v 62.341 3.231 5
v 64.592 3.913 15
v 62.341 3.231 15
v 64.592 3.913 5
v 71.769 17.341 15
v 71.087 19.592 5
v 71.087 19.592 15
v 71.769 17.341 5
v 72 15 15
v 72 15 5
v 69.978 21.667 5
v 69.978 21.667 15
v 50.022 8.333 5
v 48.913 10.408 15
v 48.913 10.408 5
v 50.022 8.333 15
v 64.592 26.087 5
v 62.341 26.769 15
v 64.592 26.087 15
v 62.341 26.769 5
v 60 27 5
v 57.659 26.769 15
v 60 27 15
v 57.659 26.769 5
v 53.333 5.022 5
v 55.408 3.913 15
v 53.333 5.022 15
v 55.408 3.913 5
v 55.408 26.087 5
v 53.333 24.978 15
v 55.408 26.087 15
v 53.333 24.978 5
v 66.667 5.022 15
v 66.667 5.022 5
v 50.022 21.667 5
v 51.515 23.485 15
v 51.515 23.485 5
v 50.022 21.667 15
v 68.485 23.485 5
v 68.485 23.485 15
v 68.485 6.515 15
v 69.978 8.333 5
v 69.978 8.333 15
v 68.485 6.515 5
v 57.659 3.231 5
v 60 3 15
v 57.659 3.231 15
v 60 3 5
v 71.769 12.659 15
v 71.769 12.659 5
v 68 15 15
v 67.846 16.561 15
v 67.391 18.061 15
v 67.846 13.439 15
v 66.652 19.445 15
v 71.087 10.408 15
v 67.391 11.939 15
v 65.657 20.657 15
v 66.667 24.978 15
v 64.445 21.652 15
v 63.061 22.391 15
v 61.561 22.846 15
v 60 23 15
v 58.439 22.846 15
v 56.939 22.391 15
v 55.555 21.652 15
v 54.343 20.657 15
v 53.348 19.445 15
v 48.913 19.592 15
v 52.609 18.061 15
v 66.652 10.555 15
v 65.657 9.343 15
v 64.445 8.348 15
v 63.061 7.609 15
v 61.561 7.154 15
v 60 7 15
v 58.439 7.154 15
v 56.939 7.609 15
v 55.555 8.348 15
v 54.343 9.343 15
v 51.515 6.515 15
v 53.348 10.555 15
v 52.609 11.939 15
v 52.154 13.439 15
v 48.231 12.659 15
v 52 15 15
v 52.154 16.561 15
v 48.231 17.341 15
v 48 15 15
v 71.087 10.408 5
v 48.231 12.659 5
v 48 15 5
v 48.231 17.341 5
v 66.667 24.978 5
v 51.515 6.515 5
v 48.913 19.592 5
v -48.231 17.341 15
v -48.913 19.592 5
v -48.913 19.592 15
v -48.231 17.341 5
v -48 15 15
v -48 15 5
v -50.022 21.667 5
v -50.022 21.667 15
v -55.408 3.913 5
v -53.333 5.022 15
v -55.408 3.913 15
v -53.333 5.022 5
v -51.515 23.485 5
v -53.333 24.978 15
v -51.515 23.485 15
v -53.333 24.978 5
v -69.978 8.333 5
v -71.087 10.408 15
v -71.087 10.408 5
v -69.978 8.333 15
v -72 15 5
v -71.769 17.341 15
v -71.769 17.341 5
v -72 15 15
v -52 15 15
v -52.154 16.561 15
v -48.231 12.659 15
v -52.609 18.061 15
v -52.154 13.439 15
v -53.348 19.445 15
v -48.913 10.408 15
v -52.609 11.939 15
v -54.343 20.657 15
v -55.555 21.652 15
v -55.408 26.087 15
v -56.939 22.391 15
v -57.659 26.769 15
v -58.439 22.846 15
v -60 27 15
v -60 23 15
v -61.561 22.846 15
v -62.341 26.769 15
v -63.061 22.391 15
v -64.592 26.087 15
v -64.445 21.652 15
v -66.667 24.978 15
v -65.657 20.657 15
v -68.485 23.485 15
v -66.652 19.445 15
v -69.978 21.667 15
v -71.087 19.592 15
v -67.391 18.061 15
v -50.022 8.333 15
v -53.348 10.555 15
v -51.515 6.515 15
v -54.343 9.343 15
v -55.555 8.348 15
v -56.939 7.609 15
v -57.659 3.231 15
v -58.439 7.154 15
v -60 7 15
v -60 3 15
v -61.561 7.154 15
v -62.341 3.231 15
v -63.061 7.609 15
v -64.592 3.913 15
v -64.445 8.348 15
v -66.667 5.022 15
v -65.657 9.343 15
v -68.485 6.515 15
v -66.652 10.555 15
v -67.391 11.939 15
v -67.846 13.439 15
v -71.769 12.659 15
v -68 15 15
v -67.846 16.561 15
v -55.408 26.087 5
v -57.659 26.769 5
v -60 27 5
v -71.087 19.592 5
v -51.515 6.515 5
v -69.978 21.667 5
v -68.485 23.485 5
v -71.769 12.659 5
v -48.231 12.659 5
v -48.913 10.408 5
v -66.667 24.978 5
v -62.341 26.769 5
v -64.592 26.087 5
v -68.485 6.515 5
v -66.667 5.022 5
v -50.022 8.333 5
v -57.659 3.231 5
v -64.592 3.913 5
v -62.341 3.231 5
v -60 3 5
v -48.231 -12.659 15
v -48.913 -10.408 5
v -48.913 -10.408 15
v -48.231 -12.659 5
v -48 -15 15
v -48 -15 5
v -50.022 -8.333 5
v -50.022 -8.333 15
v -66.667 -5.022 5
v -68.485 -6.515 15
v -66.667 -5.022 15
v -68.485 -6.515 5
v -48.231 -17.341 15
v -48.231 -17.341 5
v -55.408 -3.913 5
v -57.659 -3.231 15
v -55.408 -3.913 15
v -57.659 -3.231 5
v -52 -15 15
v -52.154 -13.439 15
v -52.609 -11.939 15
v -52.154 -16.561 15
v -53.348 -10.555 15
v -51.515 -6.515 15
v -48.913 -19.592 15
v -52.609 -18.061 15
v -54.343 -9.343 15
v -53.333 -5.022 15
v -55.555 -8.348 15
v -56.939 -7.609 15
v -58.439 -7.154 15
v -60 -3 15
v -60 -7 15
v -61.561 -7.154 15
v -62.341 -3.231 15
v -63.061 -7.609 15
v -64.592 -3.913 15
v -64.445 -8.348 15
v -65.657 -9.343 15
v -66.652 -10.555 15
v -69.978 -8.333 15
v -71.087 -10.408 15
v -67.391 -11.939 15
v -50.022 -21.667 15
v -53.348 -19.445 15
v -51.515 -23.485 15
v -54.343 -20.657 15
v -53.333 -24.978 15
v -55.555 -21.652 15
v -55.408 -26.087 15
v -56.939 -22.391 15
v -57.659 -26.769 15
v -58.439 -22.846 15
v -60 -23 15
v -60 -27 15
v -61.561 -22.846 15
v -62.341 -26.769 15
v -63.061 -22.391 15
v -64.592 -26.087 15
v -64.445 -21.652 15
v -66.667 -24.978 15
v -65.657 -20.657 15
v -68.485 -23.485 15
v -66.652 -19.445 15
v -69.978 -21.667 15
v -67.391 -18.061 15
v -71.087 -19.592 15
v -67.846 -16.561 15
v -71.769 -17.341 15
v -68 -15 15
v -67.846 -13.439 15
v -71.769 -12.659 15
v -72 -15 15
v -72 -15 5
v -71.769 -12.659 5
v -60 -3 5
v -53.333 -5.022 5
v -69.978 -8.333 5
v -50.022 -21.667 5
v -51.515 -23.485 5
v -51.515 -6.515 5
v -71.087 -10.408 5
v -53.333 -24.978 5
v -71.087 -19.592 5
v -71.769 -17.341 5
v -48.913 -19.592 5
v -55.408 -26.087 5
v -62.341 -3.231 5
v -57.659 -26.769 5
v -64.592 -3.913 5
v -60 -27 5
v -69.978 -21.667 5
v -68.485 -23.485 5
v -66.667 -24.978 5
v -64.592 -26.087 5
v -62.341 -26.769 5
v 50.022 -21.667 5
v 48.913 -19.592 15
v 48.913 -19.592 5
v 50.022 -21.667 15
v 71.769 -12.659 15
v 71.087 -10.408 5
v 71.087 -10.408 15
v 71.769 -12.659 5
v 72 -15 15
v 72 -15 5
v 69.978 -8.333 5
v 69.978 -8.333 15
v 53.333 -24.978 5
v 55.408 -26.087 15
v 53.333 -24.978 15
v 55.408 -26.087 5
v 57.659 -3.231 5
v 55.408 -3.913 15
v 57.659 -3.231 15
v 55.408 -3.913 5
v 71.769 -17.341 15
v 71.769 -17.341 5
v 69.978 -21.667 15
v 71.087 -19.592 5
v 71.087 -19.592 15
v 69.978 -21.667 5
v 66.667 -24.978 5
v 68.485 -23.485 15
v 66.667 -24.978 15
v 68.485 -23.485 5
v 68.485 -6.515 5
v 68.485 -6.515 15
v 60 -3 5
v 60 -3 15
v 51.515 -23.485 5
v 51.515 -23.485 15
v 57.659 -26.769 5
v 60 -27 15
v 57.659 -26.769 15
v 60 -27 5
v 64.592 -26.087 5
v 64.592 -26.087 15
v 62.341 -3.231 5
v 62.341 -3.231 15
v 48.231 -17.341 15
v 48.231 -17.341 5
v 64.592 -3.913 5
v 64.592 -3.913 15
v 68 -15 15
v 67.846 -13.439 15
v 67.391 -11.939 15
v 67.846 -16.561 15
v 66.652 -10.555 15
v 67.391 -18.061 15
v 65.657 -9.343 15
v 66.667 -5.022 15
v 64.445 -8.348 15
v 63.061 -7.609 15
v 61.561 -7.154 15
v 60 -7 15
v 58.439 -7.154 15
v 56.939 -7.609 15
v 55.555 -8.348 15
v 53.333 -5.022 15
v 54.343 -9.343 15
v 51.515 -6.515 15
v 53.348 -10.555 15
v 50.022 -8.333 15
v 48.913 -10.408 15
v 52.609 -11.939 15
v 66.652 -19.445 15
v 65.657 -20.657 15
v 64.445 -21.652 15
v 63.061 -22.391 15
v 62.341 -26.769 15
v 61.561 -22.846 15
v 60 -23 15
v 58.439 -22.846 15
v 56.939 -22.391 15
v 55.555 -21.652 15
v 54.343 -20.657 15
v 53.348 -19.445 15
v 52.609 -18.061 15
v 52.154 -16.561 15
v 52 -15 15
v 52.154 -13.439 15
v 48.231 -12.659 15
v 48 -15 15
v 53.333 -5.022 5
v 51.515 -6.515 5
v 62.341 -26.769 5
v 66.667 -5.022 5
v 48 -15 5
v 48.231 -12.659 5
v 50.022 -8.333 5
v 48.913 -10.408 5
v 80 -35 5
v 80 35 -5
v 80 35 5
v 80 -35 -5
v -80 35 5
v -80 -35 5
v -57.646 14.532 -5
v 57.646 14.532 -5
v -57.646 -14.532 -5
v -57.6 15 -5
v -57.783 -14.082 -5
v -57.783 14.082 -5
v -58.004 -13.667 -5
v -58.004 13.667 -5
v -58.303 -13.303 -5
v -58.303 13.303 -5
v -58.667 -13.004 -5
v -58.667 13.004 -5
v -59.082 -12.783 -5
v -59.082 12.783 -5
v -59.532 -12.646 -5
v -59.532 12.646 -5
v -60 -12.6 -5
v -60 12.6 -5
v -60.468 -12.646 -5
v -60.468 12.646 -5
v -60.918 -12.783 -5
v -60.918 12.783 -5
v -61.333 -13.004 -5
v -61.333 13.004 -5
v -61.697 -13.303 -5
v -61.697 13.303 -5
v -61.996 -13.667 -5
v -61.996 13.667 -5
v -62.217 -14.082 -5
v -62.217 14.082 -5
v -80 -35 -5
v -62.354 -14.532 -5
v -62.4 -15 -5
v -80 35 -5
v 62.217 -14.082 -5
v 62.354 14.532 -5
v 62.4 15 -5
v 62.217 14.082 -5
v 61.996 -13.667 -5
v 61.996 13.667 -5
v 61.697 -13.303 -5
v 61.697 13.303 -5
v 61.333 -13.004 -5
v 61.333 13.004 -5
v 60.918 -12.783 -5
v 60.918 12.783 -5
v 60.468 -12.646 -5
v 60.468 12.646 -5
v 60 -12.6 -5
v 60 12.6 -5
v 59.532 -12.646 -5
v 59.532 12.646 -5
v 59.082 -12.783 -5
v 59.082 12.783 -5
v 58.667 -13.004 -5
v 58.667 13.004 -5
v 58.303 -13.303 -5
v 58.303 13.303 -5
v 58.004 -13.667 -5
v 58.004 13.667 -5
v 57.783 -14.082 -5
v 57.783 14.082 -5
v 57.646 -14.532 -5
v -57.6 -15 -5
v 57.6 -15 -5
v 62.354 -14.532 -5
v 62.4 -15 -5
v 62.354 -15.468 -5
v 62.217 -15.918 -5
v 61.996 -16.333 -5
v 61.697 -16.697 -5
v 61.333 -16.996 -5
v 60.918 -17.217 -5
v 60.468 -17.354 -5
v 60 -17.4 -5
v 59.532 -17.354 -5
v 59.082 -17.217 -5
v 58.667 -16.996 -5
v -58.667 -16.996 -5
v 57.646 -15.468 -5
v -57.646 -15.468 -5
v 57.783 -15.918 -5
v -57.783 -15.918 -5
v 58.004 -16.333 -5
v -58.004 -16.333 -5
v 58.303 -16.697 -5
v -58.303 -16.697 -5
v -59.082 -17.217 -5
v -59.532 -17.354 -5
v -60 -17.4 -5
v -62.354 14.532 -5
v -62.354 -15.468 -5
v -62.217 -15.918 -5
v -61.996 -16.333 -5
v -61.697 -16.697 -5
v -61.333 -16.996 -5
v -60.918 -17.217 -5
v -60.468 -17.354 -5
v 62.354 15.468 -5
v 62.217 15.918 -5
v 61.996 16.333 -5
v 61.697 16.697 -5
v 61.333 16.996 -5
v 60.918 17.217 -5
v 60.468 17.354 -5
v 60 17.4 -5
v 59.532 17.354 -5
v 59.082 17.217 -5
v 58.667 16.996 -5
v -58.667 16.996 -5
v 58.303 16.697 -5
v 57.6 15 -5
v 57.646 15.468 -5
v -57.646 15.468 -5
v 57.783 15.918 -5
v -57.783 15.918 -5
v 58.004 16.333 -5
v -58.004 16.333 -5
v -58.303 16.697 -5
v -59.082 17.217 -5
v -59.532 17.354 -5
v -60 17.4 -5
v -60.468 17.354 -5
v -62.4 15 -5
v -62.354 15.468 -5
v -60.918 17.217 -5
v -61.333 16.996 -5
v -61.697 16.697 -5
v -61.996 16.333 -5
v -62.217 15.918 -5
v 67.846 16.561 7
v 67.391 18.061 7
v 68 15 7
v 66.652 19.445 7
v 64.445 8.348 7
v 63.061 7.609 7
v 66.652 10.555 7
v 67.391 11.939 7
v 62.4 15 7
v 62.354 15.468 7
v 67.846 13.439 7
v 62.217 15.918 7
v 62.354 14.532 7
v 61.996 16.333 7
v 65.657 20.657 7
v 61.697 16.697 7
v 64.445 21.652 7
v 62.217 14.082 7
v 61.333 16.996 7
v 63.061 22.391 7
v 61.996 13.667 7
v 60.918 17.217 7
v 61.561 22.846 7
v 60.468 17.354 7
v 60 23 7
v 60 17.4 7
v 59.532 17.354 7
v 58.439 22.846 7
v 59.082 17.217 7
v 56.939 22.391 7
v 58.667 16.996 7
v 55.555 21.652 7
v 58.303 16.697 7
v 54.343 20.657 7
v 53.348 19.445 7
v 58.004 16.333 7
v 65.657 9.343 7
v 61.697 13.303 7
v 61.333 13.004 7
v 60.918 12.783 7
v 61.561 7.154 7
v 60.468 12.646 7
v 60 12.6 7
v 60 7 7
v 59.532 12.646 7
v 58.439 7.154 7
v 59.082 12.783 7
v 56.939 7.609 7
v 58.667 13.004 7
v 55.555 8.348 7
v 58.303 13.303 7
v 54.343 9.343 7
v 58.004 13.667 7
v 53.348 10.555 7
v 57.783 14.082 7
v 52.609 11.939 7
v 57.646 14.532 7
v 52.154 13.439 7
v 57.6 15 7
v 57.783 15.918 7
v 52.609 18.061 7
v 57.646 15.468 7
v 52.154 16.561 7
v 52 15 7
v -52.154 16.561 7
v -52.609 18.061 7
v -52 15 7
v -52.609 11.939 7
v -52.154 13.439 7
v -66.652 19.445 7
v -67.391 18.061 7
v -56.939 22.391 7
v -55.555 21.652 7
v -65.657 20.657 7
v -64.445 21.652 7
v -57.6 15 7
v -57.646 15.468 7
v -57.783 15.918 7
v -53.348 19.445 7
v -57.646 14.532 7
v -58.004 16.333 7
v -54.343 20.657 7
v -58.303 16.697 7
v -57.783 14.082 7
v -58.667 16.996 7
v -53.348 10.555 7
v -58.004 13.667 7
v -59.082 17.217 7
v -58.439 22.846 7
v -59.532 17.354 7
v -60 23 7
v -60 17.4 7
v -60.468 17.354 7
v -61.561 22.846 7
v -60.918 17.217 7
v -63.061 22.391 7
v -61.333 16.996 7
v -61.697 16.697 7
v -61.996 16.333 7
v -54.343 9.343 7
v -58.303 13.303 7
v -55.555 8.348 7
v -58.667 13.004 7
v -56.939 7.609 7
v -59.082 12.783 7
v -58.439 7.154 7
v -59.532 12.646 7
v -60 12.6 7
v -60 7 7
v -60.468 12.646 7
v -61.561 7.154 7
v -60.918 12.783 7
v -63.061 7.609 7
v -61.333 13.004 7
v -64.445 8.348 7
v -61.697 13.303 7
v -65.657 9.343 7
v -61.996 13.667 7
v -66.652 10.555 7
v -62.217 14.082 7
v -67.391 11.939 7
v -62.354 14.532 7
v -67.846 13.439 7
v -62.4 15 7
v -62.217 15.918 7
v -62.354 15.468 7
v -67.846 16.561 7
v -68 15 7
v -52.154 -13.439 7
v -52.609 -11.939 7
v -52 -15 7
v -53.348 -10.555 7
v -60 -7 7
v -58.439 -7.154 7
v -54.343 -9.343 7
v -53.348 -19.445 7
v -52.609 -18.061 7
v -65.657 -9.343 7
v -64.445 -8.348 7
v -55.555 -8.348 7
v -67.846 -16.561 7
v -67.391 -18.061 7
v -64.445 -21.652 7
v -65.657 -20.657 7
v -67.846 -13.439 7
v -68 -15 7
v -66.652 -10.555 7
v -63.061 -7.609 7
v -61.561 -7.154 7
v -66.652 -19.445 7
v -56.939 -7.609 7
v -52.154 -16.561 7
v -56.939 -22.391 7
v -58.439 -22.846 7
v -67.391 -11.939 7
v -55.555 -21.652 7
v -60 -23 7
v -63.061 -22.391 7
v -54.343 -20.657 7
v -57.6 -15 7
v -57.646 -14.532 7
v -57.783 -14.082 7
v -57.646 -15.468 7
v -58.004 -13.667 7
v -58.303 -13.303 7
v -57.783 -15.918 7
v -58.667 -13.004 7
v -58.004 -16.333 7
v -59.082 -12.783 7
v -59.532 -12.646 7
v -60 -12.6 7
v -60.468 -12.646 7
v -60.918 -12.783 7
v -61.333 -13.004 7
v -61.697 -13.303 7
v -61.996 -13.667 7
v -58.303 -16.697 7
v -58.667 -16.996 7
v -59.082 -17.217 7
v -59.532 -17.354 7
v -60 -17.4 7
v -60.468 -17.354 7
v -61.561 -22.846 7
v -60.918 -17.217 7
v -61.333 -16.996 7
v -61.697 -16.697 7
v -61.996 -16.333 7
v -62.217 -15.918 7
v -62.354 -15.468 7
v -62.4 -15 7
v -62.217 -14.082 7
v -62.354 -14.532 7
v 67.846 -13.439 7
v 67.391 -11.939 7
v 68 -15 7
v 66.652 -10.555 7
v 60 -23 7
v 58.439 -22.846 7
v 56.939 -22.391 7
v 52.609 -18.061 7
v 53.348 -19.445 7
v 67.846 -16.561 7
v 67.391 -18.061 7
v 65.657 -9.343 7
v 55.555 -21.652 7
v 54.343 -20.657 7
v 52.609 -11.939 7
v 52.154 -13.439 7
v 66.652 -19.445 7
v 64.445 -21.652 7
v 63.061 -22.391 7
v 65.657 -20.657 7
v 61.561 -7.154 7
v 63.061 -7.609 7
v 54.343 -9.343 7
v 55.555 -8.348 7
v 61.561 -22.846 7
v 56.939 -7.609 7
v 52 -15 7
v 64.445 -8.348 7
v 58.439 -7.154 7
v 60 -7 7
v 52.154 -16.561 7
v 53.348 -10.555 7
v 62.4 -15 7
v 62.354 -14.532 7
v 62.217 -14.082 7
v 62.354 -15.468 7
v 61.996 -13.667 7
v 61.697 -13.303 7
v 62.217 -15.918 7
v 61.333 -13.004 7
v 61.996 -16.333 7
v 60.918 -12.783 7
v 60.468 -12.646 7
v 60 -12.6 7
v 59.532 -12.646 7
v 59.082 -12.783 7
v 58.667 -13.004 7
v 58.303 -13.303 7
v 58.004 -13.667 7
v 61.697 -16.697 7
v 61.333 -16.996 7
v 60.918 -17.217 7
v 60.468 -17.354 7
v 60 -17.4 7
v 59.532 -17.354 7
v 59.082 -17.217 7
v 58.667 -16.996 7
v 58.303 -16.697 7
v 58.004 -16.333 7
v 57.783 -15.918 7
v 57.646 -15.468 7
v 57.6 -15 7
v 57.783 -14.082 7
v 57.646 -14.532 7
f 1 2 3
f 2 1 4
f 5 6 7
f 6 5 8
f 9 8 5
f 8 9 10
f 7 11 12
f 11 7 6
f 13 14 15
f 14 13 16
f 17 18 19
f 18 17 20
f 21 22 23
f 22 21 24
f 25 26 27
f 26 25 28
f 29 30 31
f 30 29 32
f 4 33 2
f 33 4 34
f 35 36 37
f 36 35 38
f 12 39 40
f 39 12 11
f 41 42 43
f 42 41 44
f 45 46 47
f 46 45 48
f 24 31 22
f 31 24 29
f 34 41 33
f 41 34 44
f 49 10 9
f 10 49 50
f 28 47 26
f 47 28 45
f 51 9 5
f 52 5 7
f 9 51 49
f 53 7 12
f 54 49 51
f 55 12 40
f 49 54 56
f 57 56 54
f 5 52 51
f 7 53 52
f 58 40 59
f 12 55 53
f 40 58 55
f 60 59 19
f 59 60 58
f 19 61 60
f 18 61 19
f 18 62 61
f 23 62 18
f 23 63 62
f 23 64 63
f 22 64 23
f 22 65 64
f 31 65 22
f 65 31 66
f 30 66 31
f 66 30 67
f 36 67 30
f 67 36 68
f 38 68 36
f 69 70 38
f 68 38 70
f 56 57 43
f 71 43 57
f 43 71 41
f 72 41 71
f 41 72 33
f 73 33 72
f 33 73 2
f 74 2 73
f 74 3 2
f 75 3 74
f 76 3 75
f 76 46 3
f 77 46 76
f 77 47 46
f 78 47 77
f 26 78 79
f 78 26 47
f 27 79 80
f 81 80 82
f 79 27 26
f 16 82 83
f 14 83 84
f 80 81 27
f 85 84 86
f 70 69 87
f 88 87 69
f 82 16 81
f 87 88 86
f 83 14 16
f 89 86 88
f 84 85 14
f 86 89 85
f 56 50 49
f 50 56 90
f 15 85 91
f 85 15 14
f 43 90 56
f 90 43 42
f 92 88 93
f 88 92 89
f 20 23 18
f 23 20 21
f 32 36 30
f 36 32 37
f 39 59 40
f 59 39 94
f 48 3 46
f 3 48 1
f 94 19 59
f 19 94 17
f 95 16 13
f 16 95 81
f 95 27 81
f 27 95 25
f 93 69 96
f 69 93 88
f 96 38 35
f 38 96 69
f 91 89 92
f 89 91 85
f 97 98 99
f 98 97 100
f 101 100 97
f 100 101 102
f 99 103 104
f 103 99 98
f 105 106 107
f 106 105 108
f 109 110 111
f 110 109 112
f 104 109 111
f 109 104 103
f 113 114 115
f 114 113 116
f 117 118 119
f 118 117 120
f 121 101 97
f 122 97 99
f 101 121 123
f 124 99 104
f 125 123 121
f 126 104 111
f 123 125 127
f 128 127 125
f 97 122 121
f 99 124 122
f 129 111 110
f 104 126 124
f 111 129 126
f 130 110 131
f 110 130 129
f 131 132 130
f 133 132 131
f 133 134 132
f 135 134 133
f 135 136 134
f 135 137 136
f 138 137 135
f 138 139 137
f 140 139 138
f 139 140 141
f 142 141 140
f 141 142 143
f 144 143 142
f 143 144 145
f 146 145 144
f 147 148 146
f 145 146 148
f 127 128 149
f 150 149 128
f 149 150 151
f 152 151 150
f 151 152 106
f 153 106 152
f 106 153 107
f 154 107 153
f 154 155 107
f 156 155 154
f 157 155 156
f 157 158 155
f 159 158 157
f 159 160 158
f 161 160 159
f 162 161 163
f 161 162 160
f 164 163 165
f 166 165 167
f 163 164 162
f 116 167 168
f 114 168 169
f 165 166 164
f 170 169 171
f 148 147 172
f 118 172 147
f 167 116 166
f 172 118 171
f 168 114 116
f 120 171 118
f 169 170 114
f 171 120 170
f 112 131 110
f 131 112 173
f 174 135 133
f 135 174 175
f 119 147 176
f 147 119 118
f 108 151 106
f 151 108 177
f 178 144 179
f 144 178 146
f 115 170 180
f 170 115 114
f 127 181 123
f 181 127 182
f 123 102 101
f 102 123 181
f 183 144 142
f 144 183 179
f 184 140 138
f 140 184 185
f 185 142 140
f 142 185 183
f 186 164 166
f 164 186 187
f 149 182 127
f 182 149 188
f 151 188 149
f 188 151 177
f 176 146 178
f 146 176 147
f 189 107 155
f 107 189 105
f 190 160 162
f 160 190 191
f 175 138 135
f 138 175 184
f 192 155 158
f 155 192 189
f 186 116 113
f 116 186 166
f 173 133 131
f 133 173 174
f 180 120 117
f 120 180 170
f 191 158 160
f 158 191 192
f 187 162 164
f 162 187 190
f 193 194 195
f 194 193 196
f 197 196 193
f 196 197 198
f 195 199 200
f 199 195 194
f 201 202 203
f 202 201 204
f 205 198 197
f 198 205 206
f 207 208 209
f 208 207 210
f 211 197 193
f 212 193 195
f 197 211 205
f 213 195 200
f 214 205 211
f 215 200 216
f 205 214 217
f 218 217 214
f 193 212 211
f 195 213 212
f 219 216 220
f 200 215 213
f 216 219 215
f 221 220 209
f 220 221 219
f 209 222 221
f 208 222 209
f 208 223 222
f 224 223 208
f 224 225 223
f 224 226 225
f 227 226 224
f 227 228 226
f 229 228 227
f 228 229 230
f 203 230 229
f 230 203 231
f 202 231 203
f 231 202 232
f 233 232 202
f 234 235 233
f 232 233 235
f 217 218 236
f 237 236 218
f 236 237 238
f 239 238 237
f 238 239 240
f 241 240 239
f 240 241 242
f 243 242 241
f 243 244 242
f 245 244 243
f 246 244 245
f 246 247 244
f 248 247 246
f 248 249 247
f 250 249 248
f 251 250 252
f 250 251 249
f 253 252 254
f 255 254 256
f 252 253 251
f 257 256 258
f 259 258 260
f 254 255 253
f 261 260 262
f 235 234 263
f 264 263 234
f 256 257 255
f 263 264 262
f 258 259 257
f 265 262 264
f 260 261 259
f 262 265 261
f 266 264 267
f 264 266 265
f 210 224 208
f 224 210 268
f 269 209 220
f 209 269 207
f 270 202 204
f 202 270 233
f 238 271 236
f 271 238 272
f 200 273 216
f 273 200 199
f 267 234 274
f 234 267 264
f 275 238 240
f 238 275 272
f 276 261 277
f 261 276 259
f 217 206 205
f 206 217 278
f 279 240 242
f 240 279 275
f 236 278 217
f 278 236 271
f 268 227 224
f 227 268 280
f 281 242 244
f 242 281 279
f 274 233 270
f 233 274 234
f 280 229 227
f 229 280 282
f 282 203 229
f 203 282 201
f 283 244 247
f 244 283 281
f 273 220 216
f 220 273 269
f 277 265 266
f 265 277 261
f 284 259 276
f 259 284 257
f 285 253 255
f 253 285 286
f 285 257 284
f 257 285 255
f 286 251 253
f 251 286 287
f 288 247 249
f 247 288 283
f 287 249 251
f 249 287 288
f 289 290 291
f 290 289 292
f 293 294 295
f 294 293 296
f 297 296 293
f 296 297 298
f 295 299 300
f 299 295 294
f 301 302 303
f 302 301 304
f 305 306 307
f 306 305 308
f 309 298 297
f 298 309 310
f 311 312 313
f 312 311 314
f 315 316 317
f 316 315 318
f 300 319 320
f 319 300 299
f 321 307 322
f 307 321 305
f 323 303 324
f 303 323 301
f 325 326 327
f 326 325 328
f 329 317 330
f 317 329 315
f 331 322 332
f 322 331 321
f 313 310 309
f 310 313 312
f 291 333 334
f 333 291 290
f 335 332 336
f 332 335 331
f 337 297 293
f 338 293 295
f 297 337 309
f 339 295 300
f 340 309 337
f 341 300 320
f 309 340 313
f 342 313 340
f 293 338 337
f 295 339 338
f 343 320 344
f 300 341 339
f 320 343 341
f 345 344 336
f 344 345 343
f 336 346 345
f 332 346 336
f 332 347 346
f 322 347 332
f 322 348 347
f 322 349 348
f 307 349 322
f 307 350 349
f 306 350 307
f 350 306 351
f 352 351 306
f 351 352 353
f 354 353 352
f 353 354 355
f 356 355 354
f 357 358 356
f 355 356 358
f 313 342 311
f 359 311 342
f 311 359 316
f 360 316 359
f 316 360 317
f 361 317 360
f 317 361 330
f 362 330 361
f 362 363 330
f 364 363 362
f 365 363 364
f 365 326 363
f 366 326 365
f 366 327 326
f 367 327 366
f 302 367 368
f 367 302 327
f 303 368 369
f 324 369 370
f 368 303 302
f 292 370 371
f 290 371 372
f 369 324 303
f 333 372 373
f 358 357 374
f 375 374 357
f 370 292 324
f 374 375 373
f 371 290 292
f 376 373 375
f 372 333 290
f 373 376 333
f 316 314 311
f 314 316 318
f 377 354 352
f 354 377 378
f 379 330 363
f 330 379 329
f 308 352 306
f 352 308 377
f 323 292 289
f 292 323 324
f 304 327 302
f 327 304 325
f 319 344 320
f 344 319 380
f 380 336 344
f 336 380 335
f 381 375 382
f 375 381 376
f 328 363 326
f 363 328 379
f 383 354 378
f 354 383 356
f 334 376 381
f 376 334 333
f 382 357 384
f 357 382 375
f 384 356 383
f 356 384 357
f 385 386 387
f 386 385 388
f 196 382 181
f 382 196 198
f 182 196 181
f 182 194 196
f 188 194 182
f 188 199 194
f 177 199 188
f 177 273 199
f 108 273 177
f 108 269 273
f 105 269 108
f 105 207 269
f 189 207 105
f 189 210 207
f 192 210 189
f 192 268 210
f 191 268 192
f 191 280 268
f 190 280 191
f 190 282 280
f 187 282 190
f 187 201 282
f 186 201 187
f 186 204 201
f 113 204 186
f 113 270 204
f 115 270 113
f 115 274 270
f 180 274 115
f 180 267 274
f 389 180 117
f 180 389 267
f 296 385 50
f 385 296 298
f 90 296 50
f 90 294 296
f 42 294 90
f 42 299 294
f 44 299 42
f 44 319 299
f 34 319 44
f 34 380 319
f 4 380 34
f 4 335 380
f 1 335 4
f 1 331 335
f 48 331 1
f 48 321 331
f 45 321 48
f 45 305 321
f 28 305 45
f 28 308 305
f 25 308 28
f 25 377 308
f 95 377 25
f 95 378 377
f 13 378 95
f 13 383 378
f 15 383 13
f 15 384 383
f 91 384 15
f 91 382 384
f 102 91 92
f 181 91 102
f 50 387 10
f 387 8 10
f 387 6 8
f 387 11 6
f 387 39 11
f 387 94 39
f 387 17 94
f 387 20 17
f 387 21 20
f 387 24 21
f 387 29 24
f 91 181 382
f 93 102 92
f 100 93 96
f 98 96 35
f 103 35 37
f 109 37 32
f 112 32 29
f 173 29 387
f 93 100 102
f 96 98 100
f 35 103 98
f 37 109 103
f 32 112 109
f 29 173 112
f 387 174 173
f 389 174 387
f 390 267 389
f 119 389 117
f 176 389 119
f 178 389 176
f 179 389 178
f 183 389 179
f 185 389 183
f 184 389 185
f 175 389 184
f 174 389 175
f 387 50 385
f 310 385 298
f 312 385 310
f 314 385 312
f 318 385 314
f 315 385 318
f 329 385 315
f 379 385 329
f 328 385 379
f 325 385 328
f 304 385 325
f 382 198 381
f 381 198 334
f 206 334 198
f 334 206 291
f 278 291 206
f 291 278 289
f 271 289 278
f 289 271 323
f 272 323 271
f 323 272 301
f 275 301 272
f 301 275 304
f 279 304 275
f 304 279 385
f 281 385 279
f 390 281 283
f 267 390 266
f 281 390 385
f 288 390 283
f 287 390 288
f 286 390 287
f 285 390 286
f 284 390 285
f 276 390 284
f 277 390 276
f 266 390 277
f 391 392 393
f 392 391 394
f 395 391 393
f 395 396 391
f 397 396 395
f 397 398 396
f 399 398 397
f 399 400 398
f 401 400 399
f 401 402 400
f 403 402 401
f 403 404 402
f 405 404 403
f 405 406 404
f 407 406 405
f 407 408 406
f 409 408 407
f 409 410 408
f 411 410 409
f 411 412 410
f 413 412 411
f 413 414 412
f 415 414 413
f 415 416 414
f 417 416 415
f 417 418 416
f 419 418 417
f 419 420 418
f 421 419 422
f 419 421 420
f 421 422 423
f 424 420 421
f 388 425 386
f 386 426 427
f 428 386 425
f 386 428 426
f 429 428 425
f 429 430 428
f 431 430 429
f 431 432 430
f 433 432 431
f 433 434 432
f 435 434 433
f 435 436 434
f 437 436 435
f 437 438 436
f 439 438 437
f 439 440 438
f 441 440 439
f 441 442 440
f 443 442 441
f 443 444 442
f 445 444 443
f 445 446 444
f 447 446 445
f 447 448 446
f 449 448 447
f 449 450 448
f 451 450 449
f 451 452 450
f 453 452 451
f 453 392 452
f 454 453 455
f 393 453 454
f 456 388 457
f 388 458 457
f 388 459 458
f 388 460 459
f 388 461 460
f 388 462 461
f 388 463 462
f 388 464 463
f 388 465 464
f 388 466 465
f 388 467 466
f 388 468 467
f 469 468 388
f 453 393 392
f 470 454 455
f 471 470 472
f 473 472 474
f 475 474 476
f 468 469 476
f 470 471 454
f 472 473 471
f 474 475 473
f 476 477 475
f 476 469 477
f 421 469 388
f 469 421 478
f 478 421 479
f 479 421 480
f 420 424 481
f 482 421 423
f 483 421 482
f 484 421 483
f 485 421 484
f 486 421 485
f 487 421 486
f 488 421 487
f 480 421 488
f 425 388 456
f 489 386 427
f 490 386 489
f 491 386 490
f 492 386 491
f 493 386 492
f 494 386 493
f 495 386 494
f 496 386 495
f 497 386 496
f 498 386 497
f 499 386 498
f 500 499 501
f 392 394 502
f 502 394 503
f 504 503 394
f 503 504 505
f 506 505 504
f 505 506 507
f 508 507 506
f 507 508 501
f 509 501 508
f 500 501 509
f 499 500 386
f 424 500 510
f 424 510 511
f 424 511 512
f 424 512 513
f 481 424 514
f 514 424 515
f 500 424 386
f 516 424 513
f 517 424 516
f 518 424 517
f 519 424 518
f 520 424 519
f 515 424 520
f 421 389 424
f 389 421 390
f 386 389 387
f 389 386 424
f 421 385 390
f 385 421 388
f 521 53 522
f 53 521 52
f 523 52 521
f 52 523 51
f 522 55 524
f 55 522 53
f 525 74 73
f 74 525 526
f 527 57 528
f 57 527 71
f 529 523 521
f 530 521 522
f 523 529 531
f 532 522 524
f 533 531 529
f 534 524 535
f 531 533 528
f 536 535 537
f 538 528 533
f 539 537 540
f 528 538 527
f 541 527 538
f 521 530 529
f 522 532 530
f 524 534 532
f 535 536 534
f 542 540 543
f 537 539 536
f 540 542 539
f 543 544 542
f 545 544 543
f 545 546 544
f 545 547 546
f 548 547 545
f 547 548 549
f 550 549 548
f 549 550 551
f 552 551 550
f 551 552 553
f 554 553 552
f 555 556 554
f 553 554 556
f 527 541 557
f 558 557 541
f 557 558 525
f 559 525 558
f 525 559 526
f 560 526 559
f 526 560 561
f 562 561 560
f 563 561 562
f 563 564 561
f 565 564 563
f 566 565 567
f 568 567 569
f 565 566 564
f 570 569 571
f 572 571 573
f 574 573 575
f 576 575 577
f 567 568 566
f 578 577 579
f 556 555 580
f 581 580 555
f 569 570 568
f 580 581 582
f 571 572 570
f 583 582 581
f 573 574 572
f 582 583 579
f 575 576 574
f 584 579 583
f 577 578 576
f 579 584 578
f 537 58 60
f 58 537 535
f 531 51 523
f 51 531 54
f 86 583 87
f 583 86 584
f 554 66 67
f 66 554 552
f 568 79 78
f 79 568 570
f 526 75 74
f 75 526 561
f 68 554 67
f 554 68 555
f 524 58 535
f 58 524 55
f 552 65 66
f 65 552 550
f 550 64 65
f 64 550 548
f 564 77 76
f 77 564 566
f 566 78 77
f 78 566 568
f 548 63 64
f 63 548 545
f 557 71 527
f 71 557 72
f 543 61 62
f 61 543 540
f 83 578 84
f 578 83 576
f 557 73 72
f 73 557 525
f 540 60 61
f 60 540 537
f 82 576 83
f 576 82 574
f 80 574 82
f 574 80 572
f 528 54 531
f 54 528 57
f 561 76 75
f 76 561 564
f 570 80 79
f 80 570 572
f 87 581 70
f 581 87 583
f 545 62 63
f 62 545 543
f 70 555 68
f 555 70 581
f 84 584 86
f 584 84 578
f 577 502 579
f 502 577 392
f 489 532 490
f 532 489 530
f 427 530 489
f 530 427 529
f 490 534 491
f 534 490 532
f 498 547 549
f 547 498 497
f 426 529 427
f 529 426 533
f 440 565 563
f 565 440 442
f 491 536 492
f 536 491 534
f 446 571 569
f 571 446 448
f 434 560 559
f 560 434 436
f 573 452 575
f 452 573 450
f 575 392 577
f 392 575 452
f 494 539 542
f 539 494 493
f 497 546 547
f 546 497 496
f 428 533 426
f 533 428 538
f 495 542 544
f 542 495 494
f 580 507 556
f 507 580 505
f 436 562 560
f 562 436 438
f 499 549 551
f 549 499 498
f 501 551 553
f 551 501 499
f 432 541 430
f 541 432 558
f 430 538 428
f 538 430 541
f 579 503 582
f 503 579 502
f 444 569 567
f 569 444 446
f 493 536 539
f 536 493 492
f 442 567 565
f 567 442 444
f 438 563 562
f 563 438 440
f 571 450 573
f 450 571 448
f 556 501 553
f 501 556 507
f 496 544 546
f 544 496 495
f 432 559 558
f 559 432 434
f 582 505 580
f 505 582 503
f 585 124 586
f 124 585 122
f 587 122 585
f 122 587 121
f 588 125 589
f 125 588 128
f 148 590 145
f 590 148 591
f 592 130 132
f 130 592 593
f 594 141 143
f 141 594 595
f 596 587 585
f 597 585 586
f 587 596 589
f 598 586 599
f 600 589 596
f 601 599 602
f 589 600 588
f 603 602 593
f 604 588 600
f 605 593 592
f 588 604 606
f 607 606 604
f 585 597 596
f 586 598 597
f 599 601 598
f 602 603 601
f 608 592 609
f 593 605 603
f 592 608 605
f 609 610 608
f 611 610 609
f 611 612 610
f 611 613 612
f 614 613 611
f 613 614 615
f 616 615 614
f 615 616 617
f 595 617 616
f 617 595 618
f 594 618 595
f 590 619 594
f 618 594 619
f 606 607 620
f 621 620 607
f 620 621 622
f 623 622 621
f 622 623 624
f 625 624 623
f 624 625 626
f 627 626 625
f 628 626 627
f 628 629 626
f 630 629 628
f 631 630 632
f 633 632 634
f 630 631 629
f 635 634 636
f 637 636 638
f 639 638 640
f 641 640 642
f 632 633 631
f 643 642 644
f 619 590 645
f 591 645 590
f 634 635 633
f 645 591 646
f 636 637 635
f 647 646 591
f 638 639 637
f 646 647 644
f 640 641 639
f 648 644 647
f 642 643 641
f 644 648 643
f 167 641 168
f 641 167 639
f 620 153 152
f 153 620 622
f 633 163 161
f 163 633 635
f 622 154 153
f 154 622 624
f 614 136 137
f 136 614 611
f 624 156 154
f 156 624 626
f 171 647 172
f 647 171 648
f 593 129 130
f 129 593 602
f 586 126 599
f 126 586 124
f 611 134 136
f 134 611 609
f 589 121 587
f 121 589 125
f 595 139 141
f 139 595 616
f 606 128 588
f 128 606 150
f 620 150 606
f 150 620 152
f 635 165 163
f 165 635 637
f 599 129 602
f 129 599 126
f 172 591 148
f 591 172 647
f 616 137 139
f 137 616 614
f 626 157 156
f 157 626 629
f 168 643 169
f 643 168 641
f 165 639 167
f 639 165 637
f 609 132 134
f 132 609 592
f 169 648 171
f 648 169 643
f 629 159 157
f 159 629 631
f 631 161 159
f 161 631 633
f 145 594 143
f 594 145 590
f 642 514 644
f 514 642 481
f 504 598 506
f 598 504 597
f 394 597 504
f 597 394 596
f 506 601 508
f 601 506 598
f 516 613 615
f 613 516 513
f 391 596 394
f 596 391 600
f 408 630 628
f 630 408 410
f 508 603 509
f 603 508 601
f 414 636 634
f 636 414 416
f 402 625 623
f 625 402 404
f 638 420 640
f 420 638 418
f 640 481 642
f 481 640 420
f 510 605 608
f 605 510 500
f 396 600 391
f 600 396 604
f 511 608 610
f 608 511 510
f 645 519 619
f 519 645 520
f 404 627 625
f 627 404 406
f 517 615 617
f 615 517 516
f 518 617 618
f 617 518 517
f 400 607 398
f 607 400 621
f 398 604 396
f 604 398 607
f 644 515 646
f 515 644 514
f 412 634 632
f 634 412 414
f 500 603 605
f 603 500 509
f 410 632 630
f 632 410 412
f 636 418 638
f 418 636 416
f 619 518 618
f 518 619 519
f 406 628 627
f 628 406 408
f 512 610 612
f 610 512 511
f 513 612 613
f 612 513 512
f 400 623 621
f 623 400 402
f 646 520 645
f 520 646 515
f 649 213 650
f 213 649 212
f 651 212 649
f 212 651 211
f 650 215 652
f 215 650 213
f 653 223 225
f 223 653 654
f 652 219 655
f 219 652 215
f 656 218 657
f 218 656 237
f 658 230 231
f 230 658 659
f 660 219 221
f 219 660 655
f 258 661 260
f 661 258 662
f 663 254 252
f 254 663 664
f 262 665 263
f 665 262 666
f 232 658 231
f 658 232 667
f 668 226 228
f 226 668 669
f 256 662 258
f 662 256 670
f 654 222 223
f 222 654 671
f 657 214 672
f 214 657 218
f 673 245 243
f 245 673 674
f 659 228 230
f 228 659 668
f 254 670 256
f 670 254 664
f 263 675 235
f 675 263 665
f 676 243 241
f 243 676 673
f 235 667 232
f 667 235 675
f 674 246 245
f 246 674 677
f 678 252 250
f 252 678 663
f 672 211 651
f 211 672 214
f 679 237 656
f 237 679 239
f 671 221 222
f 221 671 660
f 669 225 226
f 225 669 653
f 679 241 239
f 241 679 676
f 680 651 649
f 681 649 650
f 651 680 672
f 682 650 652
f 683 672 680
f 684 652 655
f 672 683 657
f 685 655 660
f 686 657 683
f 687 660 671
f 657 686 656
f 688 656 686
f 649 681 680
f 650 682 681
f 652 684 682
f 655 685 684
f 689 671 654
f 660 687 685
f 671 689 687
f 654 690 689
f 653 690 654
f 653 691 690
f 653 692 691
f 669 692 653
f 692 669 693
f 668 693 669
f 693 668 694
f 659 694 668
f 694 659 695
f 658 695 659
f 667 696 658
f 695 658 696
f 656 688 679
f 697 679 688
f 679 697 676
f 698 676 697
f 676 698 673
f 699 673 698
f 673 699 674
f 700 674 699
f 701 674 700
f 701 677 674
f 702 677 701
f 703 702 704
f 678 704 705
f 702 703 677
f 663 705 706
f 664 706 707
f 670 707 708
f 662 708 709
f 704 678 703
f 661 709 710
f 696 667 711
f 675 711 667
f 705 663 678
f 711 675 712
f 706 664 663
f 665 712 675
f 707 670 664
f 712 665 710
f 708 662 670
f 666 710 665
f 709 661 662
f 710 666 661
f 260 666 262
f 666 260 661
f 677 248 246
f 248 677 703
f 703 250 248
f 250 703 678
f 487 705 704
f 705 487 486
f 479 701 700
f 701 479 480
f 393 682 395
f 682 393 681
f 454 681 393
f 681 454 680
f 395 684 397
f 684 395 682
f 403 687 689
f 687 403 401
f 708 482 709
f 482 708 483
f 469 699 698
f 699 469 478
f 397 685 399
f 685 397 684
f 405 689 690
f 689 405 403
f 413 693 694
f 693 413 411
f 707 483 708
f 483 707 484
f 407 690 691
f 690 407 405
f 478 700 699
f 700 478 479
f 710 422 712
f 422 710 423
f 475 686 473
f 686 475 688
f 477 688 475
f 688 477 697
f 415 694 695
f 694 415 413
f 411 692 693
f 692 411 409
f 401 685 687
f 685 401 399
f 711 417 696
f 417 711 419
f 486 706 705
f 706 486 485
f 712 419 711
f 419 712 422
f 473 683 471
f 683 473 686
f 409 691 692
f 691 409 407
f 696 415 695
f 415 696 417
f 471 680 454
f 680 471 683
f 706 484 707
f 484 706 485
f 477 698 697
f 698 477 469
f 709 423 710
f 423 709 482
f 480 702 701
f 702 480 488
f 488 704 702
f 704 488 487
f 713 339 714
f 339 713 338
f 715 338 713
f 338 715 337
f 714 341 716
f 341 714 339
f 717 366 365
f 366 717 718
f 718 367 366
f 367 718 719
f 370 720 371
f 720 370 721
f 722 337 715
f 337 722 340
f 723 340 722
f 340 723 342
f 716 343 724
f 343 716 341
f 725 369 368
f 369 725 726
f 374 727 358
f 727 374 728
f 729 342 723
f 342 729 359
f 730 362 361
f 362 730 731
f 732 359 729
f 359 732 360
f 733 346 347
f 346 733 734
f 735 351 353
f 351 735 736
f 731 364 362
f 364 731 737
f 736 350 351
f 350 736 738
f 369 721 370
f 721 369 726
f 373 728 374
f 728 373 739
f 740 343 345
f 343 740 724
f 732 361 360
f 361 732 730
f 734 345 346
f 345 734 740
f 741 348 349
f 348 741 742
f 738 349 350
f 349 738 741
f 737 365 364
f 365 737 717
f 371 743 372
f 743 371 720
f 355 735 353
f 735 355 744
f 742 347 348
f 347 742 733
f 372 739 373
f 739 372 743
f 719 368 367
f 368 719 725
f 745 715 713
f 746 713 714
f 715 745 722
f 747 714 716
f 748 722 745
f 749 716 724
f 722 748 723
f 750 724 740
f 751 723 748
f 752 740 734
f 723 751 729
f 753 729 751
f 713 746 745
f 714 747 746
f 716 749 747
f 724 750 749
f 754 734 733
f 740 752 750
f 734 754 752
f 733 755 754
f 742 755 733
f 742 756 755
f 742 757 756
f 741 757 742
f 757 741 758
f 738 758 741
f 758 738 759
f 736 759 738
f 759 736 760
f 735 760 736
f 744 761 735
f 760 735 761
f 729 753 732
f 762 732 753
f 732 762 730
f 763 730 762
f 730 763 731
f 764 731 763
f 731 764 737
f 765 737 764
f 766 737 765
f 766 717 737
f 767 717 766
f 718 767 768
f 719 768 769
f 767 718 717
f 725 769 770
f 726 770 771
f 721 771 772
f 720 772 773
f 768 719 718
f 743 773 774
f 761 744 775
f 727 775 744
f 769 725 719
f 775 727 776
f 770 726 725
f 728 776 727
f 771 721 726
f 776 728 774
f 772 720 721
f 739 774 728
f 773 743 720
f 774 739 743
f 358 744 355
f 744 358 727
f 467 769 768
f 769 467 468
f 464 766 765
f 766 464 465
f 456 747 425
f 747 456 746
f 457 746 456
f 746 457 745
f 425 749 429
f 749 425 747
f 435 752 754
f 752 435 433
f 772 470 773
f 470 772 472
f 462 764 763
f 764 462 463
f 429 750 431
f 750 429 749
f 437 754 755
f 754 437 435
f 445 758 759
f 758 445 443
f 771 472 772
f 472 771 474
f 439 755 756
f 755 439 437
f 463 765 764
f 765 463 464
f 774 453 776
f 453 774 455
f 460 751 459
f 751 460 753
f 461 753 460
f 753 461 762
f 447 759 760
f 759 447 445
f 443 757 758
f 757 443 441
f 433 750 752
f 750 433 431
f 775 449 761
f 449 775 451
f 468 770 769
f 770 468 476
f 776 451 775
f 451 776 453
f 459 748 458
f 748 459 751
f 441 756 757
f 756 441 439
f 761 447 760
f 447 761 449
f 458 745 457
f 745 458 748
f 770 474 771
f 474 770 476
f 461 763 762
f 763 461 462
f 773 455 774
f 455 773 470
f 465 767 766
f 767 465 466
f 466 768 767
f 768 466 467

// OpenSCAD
$fn = 32;

// ----------------------------------------------------------------------
// Socket pad plate
// bosses with counterbored sockets for the screws
// ----------------------------------------------------------------------

// --- parameters (mm) ---
base_t = 10;            // base plate thickness
boss_h = 10;            // boss height above the base plate
boss_d = 24;            // boss diameter
socket_d = 16;          // socket diameter
socket_depth = 8;       // socket depth from the boss face
bolt_d = 4.8;           // screw clearance hole through the socket floor
plate = [160, 70, 10];  // overall size (x, y, z)
edge = 20;              // boss centre offset from the plate edge
pads = 4;               // boss count, one per corner

// --- derived feature positions (mm) ---
height = base_t + boss_h;        // = 20   overall height of the part
corner_x = plate[0] / 2 - edge;  // = 60   boss centre X
corner_y = plate[1] / 2 - edge;  // = 15   boss centre Y
feature_centers = [
  [corner_x, corner_y],
  [-corner_x, corner_y],
  [-corner_x, -corner_y],
  [corner_x, -corner_y]
];   // boss centres: sockets, holes and the pads themselves are placed from here

// base plate, bosses on feature_centers, socket + through hole in each
difference() {
  union() {
    cube(plate, center = true);
    for (centre = feature_centers)
      translate([centre[0], centre[1], plate[2] / 2 - 1])
        cylinder(d = boss_d, h = boss_h + 1);
  }
  for (centre = feature_centers) {
    translate([centre[0], centre[1], plate[2] / 2 + boss_h - socket_depth])
      cylinder(d = socket_d, h = socket_depth + 1);
    translate([centre[0], centre[1], -height])
      cylinder(d = bolt_d, h = 2 * height + 2);  // through the socket floor
  }
}
